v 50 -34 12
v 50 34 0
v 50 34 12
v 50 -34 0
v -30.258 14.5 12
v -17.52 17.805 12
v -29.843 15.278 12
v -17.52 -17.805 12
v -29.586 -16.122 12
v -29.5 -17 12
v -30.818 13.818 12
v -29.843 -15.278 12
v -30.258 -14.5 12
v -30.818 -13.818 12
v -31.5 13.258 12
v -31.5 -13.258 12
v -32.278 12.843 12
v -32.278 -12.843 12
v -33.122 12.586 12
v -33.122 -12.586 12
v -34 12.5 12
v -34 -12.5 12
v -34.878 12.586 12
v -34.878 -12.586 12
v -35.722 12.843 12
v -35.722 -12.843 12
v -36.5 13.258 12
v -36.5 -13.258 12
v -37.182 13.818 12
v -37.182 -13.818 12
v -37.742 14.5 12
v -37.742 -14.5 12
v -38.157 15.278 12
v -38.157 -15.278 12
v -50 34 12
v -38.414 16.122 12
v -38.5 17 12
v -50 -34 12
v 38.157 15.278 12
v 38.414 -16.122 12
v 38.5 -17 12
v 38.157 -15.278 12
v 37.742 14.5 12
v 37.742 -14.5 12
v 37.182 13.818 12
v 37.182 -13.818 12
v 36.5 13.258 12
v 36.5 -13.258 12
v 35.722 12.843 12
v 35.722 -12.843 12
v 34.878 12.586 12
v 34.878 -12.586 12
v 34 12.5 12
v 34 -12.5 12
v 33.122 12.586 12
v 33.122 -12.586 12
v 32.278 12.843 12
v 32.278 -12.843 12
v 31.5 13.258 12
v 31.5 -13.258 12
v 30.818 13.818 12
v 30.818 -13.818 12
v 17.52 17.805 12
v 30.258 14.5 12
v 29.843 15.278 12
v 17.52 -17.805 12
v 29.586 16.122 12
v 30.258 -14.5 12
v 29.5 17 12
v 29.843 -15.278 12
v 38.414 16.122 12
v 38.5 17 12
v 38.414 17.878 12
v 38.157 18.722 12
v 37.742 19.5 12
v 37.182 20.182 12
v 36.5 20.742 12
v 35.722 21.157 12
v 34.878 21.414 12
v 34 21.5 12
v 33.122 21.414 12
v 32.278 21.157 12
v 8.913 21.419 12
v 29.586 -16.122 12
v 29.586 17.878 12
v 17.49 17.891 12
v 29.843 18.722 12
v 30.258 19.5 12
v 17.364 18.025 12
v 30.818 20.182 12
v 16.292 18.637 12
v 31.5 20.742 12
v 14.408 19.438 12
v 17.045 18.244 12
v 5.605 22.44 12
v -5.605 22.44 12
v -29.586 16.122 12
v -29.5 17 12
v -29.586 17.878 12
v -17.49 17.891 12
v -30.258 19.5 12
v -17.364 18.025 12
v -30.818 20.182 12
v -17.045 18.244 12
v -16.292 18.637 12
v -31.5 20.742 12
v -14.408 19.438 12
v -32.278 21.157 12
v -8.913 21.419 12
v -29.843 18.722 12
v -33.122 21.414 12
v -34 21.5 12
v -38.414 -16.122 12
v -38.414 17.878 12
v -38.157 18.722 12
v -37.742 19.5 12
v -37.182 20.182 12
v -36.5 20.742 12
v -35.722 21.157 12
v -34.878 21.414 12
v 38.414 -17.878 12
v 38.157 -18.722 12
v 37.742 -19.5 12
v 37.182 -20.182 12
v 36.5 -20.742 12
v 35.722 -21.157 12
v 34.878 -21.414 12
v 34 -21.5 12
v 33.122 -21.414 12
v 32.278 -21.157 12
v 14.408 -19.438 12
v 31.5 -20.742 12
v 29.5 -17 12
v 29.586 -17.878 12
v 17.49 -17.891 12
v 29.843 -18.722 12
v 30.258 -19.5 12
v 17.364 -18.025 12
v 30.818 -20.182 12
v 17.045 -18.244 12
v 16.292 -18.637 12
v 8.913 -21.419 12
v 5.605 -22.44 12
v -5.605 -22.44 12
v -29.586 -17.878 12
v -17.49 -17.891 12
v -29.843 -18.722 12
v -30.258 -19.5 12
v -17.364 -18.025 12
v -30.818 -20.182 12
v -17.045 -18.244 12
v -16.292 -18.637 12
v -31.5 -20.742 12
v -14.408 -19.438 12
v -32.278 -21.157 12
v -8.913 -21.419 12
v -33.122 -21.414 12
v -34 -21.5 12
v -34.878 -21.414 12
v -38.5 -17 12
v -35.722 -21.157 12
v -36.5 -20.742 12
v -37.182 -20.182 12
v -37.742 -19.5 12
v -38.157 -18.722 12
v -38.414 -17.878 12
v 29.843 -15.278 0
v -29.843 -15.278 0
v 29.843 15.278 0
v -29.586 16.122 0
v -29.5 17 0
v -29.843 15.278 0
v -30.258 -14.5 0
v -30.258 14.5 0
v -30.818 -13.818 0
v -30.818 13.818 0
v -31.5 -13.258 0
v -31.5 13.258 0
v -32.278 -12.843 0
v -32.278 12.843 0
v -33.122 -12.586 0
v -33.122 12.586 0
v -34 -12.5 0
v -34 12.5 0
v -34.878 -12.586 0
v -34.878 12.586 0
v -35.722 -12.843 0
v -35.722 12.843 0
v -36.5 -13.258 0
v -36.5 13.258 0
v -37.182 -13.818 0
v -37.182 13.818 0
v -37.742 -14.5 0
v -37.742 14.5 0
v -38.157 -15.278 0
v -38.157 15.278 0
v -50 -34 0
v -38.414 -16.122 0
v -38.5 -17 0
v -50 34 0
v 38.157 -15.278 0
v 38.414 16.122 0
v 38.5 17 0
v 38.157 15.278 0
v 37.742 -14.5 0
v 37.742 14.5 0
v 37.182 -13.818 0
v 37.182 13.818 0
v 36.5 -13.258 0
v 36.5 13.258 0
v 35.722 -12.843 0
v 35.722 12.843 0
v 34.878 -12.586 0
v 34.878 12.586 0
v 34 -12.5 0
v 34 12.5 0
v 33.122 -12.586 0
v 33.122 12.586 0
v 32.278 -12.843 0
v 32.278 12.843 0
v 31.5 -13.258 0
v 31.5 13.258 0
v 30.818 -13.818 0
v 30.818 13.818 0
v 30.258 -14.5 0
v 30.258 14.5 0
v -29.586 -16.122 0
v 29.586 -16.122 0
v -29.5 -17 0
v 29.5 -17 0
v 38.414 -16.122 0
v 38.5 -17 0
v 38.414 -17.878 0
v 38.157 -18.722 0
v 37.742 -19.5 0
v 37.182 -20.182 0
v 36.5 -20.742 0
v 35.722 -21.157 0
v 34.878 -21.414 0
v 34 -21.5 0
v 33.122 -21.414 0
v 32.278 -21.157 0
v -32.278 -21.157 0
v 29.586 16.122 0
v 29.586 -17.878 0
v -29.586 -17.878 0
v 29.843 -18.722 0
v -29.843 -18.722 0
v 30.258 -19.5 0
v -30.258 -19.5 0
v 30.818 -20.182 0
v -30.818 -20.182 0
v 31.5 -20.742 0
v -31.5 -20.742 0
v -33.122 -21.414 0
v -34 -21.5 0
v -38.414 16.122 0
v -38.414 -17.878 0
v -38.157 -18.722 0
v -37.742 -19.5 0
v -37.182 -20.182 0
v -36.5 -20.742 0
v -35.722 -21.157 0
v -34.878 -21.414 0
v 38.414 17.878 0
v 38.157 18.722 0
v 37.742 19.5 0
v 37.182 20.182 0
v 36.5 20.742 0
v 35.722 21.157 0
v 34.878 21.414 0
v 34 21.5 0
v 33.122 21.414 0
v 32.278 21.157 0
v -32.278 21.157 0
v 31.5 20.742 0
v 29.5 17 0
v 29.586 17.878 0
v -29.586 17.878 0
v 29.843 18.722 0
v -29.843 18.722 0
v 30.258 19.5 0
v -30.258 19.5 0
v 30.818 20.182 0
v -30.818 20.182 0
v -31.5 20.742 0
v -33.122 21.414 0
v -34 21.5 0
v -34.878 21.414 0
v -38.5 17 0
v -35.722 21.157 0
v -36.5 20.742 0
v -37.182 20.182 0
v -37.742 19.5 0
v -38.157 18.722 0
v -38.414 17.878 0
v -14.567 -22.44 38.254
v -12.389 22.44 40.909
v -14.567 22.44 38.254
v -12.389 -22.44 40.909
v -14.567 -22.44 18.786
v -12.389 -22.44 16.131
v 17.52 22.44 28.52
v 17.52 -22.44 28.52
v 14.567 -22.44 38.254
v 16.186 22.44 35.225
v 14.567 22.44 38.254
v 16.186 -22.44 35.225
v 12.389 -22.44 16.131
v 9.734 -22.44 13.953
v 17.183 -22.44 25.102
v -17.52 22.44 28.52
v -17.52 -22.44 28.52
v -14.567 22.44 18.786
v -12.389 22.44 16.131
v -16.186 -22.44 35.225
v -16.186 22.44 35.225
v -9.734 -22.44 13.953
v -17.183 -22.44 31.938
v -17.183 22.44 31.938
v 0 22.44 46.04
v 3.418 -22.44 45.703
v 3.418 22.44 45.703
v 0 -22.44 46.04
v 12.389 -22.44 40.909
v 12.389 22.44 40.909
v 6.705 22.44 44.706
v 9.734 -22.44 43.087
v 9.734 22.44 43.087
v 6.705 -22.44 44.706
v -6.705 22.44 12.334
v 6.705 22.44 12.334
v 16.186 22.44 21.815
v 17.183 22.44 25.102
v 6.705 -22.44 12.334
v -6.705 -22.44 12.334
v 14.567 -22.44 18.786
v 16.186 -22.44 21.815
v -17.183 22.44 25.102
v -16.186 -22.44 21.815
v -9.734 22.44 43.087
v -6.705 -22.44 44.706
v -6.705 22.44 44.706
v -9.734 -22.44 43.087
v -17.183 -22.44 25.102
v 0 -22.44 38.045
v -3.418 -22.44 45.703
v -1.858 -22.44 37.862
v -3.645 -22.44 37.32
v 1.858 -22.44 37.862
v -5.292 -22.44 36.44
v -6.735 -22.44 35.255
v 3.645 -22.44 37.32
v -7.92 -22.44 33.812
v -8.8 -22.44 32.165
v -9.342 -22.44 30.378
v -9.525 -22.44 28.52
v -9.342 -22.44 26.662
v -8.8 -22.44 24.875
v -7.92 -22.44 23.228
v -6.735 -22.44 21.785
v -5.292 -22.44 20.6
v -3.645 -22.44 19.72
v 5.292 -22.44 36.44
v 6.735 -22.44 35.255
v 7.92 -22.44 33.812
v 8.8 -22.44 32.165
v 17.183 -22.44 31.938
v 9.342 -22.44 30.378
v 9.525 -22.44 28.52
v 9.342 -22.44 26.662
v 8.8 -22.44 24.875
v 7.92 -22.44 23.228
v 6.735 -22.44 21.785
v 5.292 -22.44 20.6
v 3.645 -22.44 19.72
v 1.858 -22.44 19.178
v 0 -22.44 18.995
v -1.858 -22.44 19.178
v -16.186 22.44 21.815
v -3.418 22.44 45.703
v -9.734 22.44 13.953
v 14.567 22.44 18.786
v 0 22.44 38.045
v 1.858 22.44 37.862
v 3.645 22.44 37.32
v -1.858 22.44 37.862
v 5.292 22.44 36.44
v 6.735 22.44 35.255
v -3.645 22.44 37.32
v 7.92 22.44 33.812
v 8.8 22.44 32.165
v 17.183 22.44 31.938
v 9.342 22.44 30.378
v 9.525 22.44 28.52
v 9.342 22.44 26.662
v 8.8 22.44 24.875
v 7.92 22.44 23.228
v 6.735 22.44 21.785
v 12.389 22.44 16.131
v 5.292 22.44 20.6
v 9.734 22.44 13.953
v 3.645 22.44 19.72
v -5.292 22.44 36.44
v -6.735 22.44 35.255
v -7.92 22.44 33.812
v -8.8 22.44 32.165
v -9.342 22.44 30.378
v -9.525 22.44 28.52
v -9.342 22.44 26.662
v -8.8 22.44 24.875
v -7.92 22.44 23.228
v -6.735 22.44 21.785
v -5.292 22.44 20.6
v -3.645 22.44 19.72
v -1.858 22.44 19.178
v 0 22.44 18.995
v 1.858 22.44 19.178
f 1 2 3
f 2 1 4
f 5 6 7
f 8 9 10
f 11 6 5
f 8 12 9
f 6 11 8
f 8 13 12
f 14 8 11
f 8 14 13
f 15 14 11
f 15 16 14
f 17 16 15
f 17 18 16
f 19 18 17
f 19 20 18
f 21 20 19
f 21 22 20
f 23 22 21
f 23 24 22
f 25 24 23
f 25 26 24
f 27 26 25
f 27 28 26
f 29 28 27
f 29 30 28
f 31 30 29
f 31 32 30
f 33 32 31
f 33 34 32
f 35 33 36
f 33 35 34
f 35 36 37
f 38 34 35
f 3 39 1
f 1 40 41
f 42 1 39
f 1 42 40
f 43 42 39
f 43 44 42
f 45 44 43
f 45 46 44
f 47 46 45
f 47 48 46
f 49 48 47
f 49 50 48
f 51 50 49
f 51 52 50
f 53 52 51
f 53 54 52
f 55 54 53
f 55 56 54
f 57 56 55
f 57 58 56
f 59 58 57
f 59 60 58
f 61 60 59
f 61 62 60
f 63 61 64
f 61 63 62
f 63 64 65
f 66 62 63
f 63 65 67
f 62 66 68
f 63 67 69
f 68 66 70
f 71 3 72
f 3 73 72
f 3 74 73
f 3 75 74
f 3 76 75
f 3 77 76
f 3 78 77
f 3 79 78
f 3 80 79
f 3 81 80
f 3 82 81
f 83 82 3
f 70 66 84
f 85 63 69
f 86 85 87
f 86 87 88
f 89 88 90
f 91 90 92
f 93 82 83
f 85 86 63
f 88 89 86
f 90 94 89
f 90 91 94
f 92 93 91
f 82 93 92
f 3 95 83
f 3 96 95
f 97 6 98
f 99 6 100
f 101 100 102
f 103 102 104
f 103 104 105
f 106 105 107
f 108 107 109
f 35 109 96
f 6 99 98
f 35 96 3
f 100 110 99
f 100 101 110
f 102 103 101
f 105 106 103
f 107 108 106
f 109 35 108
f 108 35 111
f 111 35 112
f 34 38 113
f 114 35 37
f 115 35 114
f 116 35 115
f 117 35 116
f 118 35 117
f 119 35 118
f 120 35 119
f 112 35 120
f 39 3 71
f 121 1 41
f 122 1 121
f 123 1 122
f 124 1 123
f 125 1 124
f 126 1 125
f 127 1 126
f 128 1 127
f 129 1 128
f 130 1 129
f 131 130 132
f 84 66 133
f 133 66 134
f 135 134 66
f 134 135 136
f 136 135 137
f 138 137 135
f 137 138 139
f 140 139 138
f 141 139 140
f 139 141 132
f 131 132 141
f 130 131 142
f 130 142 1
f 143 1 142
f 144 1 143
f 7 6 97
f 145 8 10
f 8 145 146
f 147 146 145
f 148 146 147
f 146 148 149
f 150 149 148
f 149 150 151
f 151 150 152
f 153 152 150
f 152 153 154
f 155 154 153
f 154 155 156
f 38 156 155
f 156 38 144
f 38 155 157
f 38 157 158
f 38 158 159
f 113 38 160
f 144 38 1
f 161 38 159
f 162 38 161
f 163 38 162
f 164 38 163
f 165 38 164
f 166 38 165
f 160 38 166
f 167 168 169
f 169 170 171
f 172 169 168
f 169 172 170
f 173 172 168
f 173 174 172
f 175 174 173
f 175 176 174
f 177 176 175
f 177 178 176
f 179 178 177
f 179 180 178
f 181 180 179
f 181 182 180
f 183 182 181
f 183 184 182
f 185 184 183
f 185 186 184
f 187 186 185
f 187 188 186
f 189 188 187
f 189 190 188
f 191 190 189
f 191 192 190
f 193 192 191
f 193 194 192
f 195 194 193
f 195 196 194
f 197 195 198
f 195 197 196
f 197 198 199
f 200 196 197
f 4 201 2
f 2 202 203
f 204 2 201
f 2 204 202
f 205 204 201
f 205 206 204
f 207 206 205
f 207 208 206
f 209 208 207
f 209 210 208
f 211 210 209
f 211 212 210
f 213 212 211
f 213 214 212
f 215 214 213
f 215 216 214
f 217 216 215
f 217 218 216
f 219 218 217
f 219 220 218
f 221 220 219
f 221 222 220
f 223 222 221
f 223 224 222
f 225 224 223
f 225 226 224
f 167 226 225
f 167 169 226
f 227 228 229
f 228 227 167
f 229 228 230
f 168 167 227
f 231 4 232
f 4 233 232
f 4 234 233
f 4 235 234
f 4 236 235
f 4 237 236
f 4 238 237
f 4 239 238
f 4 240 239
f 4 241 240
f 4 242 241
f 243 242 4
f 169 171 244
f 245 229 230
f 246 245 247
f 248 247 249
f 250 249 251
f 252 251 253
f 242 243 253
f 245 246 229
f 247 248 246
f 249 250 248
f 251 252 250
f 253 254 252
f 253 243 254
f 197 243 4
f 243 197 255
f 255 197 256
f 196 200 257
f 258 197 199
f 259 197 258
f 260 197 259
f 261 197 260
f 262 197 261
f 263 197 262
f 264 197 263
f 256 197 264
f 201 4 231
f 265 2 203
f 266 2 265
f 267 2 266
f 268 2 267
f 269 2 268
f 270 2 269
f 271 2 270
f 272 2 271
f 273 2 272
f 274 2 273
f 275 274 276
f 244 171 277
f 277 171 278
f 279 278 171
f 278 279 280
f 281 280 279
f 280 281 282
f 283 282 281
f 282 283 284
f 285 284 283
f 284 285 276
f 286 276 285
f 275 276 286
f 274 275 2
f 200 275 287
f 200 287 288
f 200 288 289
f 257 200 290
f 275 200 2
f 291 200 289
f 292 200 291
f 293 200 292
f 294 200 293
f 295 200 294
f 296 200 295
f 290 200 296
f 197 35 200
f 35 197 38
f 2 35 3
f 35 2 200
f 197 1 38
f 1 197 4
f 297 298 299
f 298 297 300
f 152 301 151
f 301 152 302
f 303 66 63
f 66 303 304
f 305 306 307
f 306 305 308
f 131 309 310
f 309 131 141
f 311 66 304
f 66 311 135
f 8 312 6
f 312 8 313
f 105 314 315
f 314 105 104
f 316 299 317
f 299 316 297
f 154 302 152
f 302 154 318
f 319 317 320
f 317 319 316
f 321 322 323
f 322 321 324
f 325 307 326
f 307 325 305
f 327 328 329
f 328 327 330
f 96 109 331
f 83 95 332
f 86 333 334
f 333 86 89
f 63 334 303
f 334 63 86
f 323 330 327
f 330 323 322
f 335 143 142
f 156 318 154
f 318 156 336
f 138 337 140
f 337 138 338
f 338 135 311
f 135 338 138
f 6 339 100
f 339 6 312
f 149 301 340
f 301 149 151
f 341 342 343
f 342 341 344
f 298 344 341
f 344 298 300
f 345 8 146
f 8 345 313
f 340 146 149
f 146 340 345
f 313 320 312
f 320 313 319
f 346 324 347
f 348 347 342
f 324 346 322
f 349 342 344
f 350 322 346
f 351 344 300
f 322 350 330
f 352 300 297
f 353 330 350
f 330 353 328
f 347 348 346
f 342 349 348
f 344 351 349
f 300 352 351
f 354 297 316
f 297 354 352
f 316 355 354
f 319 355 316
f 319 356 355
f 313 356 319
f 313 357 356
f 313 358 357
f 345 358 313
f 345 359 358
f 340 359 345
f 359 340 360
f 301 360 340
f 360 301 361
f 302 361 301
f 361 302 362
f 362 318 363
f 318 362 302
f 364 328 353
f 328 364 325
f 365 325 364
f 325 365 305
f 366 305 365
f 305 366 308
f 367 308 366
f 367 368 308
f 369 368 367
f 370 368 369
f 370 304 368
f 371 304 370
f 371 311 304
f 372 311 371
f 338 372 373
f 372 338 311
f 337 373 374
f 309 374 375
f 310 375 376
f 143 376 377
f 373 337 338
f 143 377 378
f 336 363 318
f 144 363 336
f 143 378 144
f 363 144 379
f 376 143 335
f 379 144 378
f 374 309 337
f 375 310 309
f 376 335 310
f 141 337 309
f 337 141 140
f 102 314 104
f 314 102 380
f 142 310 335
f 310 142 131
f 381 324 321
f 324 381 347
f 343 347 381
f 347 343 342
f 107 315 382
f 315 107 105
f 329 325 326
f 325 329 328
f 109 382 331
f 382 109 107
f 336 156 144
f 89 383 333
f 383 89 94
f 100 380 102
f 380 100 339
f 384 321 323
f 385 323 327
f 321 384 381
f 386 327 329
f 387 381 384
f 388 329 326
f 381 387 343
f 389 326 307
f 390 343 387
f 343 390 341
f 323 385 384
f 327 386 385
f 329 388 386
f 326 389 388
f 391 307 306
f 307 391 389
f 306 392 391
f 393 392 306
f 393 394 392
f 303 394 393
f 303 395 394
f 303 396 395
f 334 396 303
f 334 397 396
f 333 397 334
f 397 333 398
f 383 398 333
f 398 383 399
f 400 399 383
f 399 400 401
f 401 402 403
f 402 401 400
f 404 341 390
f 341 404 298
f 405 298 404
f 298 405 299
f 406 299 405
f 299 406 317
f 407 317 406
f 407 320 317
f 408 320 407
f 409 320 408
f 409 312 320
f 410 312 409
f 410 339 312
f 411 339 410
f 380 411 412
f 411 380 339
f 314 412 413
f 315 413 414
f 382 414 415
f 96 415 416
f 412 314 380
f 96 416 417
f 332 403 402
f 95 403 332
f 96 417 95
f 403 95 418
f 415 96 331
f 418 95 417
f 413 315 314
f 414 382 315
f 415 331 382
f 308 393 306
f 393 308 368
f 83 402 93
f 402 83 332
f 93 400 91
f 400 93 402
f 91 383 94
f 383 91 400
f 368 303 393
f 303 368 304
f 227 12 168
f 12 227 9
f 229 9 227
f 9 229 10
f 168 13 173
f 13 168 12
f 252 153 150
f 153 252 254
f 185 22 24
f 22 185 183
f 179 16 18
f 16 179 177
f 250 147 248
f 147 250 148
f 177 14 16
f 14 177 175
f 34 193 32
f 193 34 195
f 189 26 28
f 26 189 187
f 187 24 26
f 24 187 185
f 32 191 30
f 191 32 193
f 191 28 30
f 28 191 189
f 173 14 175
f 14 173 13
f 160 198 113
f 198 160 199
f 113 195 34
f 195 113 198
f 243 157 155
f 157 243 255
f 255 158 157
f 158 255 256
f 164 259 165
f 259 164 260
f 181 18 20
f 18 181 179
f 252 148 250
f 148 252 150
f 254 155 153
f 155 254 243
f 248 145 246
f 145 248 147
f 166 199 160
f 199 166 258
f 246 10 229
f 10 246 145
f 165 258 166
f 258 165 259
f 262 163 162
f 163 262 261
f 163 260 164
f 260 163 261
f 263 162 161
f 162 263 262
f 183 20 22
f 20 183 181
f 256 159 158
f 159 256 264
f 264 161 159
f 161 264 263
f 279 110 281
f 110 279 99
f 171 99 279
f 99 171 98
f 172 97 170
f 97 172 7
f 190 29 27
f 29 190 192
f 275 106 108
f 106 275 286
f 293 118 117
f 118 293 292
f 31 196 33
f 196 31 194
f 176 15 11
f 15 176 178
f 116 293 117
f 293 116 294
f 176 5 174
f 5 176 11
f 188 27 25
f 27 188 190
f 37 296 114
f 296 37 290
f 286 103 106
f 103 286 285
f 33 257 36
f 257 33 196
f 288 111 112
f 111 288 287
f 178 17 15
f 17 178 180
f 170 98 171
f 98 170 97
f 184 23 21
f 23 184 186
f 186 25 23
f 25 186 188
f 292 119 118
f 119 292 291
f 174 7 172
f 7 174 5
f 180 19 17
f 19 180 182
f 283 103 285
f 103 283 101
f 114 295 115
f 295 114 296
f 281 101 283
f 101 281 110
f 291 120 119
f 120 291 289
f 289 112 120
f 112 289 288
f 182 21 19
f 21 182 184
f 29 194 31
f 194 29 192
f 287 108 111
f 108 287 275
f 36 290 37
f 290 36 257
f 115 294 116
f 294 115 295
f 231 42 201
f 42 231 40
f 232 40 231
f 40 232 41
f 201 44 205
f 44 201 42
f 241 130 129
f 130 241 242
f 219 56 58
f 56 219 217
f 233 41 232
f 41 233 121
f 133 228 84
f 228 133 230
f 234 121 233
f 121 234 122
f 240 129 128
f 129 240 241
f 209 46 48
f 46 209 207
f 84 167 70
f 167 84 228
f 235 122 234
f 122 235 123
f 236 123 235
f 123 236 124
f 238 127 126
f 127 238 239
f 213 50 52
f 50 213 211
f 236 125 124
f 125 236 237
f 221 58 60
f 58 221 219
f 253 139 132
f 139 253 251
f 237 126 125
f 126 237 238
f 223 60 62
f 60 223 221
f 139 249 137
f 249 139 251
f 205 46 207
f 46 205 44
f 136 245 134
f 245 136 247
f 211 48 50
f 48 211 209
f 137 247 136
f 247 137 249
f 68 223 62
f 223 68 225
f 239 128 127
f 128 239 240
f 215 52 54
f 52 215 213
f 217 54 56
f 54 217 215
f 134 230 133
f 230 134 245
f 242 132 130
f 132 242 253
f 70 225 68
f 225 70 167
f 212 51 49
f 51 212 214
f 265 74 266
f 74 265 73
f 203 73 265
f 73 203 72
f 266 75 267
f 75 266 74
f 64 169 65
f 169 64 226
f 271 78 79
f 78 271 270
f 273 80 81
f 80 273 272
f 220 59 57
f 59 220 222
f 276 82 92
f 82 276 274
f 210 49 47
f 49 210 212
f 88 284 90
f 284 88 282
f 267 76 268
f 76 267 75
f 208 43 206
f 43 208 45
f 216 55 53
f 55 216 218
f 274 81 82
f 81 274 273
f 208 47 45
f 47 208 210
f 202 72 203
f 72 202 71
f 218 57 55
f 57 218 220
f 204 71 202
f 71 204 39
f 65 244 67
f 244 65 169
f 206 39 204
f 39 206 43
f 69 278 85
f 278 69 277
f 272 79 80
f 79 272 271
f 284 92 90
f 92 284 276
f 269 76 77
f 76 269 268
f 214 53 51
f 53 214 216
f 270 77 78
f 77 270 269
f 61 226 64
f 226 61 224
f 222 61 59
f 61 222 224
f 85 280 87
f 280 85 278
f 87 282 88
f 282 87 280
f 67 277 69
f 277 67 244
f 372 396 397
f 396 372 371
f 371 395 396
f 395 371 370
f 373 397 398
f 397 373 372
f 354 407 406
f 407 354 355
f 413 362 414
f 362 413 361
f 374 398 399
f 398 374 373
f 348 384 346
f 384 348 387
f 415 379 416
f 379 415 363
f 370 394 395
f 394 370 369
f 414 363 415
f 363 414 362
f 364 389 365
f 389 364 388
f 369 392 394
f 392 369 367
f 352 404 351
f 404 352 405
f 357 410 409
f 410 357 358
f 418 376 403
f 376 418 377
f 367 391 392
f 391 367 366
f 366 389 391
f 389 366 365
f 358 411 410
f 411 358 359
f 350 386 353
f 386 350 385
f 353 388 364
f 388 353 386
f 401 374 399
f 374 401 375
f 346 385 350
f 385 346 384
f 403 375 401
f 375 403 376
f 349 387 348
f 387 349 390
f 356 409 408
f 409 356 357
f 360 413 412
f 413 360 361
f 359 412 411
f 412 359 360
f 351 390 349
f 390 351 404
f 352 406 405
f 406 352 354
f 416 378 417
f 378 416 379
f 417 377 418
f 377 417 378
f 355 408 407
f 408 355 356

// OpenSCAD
$fn = 32;

// ----------------------------------------------------------------------
// Bearing block: 100 x 68 mm base, 19.05 mm bore at 28.52 mm
// ----------------------------------------------------------------------

// --- parameters (mm) ---
base_w = 100;             // base width
base_d = 68;              // base depth
base_t = 12;              // base thickness
bore_d = 19.05;           // shaft / bearing bore
house_r = 17.52;          // housing outer radius
house_len = 44.88;        // housing length along the shaft
foot_w = 35.04;           // foot width under the housing
foot_len = 34.88;         // foot length along the shaft
axis_z = 28.52;           // bore axis height above the base
holes_d = 9;              // mounting holes
hole_x = 34;              // mounting hole spacing

difference() {
  union() {
    /* base plate with its underside on z = 0 */
    translate([0, 0, base_t / 2]) cube([base_w, base_d, base_t], center = true);
    /* hull foot: a straight web blending into the round housing */
    hull() {
      translate([0, 0, base_t - 0.5]) cube([foot_w, foot_len, 1.6], center = true);
      translate([0, 0, axis_z]) rotate([-90, 0, 0]) cylinder(h = house_len, d = 2 * house_r, center = true);
    }
  }
  /* bore through the housing, 2.5 mm clear on both sides */
  translate([0, 0, axis_z]) rotate([-90, 0, 0]) cylinder(h = house_len + 5, d = bore_d, center = true);
  /* mounting holes through the base plate */
  for (hx = [-34, 34]) {
    for (hy = [-17, 17]) {
      translate([hx, hy, -2.5]) cylinder(h = base_t + 5, d = holes_d);
    }
  }
}
